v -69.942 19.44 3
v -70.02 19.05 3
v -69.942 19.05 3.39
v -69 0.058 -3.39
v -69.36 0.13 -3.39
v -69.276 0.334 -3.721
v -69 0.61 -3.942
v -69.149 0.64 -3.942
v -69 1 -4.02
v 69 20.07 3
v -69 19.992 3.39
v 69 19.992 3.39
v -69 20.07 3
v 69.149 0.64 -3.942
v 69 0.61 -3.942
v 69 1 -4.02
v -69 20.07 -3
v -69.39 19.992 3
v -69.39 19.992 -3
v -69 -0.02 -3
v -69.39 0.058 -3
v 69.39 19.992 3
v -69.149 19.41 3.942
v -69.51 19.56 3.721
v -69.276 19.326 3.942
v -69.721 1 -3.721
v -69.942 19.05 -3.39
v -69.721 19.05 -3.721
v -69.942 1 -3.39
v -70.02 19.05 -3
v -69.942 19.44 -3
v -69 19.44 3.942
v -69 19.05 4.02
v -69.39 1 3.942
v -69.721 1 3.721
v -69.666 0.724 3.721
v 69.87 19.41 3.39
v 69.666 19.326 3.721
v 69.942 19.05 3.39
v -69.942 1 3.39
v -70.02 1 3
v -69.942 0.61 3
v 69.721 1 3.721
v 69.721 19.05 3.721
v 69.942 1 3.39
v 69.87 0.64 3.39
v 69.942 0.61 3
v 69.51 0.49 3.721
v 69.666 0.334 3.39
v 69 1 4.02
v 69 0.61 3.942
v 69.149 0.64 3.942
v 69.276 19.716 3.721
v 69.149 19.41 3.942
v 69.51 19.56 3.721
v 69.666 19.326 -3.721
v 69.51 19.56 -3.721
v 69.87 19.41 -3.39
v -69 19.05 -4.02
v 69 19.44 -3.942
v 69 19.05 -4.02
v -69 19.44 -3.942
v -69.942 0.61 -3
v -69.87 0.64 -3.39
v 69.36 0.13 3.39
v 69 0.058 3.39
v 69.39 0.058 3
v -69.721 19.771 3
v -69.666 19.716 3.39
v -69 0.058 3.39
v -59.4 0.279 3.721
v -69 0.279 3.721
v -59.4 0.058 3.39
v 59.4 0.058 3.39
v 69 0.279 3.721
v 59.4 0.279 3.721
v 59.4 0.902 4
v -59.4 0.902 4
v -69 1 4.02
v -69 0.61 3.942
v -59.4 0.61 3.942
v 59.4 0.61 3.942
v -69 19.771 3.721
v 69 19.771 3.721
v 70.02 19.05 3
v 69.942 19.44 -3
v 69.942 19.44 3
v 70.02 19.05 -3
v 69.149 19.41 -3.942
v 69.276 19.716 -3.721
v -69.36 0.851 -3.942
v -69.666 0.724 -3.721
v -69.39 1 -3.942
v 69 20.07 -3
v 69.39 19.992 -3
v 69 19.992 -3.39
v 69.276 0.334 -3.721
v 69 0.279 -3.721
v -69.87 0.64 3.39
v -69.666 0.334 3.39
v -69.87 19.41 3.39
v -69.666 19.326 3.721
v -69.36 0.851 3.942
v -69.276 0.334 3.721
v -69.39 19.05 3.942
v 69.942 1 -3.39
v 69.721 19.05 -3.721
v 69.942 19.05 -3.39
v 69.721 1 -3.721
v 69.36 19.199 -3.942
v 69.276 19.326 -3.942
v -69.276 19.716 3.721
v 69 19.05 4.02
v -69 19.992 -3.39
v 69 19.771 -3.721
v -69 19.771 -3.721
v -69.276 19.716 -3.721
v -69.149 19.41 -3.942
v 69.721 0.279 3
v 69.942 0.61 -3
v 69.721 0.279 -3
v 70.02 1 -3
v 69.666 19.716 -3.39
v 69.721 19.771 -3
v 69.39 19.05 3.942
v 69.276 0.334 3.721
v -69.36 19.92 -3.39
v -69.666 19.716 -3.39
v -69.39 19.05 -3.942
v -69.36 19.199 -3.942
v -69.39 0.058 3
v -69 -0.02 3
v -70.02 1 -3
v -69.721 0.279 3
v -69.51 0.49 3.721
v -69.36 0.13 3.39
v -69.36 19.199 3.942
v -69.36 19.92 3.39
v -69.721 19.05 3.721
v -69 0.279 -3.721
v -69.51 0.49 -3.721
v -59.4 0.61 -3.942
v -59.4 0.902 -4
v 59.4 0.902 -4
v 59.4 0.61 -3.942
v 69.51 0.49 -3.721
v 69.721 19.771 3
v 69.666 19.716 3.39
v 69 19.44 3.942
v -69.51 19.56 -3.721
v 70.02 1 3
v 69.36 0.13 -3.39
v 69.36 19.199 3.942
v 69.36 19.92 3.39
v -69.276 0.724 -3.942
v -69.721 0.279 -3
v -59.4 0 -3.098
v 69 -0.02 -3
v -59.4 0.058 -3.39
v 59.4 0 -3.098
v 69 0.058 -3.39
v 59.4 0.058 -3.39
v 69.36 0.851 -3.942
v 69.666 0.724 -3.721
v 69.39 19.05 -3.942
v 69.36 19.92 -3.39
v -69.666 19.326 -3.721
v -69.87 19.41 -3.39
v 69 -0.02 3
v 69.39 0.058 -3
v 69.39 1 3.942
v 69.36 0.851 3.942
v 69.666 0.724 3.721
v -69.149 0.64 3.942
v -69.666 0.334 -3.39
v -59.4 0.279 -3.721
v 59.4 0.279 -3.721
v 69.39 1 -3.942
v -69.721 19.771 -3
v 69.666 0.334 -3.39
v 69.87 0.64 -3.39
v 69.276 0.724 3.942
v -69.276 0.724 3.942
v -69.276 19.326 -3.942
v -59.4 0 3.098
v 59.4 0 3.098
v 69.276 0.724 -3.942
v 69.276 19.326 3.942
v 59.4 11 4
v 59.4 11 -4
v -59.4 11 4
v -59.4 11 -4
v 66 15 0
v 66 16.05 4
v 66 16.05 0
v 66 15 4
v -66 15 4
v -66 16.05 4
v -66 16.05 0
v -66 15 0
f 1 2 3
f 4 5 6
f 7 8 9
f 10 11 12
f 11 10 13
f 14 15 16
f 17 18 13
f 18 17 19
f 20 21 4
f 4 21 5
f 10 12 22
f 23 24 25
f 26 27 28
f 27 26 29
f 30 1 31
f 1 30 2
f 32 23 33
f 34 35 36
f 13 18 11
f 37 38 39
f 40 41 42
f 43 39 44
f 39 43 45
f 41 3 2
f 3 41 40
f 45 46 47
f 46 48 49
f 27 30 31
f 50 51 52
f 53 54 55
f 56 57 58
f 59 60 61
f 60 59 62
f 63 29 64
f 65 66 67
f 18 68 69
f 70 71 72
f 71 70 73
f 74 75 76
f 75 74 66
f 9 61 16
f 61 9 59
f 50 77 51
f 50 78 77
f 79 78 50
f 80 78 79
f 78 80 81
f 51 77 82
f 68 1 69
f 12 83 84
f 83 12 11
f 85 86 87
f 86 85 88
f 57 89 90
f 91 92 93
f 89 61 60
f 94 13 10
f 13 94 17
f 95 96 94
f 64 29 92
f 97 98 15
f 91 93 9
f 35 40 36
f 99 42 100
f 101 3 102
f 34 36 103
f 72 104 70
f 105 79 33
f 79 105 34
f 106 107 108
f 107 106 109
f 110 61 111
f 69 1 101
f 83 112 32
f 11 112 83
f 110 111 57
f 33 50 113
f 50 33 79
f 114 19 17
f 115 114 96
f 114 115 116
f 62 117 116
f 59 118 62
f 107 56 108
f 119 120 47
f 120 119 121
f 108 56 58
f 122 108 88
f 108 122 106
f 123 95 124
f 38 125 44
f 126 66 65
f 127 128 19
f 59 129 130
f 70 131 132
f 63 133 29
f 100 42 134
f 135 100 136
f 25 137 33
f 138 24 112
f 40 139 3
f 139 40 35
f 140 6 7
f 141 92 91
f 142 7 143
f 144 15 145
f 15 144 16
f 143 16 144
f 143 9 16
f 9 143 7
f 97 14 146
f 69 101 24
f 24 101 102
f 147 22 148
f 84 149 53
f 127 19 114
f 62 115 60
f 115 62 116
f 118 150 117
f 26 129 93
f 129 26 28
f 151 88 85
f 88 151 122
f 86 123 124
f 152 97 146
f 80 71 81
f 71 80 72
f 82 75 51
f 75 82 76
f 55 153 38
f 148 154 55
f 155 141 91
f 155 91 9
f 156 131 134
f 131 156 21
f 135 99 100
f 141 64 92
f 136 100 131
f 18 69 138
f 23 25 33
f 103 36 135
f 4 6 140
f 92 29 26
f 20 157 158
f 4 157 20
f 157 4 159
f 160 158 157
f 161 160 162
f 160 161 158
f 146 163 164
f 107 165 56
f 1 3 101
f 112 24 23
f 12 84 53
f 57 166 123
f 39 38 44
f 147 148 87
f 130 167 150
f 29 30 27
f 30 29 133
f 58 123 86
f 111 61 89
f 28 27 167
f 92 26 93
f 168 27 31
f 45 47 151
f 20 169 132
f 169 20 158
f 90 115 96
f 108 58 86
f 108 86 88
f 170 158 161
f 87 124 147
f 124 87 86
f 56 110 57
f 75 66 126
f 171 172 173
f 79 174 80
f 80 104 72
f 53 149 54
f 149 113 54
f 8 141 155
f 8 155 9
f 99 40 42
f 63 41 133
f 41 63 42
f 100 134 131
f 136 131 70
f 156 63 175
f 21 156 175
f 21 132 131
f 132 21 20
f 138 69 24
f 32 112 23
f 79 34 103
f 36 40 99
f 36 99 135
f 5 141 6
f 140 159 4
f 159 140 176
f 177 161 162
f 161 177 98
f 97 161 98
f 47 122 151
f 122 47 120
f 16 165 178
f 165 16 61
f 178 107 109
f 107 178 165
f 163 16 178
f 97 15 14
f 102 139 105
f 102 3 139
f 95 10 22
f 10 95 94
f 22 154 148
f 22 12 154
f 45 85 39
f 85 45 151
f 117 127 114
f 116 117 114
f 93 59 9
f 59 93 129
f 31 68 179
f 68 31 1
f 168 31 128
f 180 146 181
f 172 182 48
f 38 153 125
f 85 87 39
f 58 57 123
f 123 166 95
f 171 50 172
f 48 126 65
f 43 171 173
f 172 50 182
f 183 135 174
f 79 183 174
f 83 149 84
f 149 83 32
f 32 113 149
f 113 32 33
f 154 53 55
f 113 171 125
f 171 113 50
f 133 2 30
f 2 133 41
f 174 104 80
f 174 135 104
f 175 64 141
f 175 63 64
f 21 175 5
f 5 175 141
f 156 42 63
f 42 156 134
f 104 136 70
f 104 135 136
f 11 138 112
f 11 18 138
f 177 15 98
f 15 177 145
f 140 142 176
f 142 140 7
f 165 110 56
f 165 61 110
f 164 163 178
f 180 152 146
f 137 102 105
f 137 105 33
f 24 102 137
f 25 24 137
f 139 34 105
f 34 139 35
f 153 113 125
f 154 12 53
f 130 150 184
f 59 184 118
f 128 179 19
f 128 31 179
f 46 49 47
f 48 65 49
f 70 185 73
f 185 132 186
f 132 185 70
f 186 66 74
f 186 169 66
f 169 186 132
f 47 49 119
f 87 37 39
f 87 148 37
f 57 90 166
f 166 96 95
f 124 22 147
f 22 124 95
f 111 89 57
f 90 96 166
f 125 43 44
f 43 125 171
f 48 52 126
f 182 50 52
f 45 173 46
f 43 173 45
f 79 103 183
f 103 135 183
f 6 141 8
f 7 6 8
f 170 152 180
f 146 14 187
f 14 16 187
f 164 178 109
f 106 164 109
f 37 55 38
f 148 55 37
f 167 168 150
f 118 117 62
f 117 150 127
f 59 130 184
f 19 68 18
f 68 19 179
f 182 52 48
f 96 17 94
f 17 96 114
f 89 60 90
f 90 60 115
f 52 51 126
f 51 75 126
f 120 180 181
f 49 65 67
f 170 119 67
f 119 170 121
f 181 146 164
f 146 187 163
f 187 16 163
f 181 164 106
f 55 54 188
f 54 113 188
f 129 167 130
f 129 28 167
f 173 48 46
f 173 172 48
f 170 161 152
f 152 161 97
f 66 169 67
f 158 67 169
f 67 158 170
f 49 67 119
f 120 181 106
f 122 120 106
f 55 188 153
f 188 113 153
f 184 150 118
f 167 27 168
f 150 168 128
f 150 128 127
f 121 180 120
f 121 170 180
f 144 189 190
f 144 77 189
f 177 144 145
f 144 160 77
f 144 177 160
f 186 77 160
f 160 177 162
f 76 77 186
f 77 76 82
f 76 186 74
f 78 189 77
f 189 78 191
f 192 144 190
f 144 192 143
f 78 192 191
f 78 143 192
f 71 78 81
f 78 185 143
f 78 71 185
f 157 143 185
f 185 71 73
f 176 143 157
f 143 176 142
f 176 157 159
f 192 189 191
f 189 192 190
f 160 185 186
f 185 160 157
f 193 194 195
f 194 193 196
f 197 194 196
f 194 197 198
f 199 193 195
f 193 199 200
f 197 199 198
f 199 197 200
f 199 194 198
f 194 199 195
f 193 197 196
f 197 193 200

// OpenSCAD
include <BOSL/shapes.scad>

metal_thick=1.05;    // Thickness of the metal base
fil_thick=4;        // Thickness of the filament areas
l=132;              // Length of the metal base at the end
h=11;               // Height of the slot above the bottom

// Rendering settings
$fa=1;
//$fs=2;    // Drafting quality
$fs=0.5;    // Finish quality

th = fil_thick * 2;

difference() {
    // Outer "box"
    cuboid([l + (2*fil_thick),
            h + (2*fil_thick) + metal_thick,
            th],
           fillet=1,
           align=V_BACK);
    
    // "Legs" cutout
    cuboid([l*0.9, h, th], align=V_BACK);
    
    // Metal cutout
    #translate([0, h+fil_thick, th/4]) {
        cuboid([l, metal_thick, th/2], align=V_BACK);
    }
}
